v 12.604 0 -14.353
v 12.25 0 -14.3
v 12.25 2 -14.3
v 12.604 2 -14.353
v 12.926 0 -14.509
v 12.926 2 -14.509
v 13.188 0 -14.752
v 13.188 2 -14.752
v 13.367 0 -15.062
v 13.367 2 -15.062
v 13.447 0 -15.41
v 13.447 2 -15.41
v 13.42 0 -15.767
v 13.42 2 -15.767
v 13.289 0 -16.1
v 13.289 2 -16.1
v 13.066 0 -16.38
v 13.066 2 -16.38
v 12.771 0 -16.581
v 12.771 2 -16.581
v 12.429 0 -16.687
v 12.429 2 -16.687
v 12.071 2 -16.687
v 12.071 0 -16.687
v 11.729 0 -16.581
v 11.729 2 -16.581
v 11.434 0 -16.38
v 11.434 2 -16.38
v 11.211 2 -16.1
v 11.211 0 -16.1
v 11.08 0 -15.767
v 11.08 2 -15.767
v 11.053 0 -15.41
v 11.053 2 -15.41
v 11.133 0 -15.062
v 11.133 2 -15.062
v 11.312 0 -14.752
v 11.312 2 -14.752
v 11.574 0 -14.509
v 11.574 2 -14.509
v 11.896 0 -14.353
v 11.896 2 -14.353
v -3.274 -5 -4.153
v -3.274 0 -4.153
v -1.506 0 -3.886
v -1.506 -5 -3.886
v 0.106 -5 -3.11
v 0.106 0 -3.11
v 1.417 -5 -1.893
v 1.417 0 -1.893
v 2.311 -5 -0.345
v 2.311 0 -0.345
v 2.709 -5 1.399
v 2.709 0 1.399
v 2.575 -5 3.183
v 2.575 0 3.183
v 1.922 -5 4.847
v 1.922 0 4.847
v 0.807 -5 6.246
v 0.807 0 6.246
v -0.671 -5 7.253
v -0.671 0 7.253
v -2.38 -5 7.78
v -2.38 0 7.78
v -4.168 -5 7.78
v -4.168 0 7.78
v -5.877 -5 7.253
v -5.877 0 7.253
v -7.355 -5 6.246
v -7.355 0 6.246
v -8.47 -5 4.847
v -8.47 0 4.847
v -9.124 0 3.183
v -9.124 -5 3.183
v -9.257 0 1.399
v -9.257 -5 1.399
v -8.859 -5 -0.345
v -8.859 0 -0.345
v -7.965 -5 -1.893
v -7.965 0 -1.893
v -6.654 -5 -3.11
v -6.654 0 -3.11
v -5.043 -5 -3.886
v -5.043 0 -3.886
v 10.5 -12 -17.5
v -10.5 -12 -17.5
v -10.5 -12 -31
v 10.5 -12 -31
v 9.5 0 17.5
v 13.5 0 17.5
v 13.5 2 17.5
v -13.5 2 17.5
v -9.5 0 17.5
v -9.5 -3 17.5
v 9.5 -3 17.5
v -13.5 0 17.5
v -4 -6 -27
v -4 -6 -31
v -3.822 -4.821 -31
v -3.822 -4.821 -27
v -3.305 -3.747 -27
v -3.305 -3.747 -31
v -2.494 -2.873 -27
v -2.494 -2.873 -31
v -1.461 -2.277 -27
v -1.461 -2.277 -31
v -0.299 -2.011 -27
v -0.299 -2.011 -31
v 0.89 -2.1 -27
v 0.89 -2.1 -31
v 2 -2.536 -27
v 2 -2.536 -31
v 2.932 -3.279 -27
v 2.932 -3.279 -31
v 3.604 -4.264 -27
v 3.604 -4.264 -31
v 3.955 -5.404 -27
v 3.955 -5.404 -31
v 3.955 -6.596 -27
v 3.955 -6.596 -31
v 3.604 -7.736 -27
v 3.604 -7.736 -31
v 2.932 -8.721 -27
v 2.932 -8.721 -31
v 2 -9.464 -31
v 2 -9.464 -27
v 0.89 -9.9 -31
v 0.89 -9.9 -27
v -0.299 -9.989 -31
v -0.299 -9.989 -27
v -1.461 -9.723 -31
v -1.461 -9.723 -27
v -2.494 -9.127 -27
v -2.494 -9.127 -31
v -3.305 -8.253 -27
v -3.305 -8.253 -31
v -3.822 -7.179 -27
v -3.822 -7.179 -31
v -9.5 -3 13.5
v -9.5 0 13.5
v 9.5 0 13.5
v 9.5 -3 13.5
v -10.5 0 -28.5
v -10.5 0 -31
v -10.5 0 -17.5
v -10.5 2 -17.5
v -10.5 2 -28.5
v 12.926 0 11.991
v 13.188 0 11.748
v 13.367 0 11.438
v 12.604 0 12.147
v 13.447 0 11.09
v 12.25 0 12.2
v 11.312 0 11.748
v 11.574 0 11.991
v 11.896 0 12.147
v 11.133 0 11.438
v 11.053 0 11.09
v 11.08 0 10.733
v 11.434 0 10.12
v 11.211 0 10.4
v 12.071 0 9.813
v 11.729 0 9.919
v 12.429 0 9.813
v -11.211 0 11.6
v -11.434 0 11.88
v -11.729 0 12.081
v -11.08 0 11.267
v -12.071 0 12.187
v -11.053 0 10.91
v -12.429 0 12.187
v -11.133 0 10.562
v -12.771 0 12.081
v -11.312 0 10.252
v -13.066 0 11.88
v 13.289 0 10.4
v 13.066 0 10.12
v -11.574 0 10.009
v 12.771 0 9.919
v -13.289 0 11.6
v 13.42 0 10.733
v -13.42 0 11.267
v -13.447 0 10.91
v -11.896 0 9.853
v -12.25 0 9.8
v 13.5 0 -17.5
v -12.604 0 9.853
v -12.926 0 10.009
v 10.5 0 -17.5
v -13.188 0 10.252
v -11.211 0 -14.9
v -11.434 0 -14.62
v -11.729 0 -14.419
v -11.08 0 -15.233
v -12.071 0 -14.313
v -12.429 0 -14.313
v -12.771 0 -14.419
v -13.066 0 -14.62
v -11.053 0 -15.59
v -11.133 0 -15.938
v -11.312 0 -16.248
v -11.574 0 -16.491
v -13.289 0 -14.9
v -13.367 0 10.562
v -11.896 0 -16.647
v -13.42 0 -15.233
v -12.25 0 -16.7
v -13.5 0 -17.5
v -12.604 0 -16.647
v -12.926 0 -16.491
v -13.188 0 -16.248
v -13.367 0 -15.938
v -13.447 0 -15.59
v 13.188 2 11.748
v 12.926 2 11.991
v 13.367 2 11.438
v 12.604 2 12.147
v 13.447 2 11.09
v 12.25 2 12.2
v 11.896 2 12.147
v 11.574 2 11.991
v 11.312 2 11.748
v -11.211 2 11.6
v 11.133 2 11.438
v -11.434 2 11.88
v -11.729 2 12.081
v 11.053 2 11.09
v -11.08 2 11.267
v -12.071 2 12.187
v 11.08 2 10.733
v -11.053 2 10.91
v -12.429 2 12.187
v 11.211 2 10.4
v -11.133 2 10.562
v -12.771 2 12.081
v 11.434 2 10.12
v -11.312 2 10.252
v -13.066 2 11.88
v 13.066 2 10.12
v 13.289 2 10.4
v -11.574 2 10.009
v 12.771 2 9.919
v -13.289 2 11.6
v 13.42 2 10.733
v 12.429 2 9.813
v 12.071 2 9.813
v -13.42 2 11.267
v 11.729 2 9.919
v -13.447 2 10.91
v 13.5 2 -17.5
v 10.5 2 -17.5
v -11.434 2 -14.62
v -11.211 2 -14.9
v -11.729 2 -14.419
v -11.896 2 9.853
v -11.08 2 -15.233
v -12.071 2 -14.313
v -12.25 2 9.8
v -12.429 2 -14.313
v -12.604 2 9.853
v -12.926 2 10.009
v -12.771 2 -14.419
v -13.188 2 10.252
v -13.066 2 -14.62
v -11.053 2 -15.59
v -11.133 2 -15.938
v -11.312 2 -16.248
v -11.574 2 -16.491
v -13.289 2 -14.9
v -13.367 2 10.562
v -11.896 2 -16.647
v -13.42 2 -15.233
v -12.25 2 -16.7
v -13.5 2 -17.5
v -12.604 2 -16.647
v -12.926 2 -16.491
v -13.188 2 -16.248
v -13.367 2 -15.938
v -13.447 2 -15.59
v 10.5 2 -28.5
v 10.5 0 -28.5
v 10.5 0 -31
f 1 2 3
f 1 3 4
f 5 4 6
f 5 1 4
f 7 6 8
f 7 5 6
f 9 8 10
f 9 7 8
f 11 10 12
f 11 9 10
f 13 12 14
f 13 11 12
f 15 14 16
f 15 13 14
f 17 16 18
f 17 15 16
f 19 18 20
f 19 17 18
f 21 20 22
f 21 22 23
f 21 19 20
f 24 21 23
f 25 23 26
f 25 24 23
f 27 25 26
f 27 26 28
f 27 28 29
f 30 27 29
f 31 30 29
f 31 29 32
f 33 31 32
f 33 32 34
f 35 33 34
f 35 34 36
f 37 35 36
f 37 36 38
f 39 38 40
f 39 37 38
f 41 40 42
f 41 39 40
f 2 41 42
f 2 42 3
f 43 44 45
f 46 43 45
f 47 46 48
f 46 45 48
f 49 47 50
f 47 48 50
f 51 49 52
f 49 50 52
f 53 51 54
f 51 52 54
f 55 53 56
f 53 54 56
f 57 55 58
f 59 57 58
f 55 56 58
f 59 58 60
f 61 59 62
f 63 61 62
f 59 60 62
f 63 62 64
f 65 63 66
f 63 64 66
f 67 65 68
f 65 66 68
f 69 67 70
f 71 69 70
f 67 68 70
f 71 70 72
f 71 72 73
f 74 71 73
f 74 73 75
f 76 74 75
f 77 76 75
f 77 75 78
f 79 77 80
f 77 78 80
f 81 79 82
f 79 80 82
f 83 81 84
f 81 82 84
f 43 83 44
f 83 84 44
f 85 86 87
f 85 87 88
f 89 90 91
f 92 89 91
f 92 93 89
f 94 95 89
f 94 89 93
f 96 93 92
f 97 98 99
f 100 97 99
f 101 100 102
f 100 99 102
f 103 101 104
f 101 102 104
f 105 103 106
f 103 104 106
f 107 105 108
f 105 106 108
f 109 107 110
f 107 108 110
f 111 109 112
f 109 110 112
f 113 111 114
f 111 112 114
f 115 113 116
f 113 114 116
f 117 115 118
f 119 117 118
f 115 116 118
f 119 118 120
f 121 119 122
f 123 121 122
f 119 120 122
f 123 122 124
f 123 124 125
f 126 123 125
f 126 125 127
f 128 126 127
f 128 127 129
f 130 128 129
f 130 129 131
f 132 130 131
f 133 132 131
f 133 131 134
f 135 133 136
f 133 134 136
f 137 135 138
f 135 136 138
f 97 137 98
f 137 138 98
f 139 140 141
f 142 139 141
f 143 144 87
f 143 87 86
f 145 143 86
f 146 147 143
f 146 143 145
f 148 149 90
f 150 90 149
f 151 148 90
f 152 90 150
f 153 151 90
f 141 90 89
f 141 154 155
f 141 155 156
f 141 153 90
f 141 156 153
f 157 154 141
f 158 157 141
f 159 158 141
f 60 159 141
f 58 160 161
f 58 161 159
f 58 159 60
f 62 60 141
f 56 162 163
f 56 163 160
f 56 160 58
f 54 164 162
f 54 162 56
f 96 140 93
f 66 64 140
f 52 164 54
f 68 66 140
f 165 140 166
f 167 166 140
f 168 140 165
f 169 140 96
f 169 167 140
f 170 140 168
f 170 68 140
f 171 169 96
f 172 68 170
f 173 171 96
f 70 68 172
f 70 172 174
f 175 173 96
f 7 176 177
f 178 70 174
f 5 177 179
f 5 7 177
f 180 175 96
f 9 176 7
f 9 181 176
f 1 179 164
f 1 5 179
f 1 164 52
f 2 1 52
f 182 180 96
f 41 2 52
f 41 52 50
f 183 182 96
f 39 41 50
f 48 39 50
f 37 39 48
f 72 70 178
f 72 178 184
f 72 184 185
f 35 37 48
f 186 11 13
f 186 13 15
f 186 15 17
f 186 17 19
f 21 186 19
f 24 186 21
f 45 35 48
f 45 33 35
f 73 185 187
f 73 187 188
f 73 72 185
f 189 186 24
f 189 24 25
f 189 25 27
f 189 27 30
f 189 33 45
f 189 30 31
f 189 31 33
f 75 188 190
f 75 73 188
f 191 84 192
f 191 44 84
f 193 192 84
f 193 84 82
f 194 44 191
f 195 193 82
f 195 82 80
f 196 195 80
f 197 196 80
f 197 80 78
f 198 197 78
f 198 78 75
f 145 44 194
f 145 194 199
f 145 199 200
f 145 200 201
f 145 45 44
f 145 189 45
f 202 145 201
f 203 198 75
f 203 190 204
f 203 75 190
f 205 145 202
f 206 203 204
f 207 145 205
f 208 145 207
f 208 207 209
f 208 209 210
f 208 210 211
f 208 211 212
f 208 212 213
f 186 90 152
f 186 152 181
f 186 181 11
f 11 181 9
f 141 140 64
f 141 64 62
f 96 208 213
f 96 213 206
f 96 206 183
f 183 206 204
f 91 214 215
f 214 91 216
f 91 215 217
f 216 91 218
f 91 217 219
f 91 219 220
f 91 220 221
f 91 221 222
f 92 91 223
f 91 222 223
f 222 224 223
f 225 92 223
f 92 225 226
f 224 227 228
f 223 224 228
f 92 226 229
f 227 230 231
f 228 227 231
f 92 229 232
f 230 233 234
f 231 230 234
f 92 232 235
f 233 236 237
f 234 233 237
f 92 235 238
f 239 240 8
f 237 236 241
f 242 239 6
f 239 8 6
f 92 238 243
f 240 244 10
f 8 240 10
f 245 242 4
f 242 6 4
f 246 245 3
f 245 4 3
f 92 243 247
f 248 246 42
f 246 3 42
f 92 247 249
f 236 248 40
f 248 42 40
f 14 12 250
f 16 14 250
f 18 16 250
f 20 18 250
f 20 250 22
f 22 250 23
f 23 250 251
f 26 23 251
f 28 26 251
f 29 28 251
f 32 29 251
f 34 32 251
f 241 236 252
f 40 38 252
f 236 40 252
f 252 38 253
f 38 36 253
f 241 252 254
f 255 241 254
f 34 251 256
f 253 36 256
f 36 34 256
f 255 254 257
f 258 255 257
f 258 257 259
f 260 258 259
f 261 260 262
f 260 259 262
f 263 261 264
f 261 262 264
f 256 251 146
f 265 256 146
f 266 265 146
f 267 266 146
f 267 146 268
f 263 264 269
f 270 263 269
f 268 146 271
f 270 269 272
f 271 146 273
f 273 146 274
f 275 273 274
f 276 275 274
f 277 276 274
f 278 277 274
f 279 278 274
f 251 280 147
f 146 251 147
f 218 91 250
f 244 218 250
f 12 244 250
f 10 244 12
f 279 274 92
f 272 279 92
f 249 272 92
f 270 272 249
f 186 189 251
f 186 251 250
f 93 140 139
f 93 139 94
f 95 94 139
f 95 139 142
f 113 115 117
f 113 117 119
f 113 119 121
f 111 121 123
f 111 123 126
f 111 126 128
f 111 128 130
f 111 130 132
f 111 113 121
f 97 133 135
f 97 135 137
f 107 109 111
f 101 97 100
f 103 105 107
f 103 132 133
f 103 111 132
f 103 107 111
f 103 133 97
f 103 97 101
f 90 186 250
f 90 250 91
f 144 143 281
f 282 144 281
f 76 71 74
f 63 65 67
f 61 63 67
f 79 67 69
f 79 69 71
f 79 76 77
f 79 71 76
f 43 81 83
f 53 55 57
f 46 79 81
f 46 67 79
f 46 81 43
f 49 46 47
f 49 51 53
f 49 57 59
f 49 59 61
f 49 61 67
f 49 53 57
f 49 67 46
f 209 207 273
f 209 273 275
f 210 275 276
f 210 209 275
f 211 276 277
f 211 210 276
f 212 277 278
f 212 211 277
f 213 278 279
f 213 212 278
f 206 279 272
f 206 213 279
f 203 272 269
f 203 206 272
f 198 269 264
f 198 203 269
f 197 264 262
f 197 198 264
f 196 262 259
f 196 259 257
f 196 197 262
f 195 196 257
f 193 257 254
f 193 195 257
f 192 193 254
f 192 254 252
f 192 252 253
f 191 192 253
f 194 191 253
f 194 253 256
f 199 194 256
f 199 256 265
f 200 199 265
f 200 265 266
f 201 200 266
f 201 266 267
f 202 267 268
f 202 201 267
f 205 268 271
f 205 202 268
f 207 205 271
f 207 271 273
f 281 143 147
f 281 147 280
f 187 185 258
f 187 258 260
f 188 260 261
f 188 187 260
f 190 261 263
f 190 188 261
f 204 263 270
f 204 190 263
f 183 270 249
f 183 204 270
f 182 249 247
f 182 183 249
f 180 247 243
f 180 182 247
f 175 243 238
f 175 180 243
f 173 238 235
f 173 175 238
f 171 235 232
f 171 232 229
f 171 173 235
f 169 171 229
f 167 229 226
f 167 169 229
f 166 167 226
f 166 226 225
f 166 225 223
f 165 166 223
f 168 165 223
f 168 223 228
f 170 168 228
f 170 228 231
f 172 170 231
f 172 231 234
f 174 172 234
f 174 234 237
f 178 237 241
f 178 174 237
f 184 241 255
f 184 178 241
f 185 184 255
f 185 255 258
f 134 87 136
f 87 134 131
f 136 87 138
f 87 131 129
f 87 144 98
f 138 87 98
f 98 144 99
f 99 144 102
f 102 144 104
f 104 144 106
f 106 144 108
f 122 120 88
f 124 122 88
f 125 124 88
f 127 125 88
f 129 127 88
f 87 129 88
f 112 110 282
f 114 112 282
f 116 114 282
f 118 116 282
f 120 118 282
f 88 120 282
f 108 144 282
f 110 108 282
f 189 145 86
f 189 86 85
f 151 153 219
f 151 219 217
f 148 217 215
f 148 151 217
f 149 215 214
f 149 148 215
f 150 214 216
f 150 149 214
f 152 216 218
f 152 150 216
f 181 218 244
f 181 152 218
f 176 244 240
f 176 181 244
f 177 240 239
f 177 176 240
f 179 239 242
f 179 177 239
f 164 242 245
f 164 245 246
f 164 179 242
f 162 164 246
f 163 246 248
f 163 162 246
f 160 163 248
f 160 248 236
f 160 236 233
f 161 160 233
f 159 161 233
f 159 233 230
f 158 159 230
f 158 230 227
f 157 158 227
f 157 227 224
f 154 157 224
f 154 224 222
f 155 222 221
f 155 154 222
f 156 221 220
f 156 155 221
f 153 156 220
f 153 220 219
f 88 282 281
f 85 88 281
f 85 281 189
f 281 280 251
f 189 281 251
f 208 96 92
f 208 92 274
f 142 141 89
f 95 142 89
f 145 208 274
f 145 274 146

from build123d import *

# Parameters (mm, degrees)
SKETCH_1_R          = 1.2
EXTRUDE_1_DEPTH     = 2
SKETCH_2_W          = 21
SKETCH_2_H          = 13.5
EXTRUDE_2_DEPTH     = 12
SKETCH_3_R          = 4
CUT_EXTRUDE_1_DEPTH = 4
SKETCH_4_W          = 19
SKETCH_4_H          = 4
EXTRUDE_3_DEPTH     = 3
SKETCH_5_R          = 6
EXTRUDE_4_DEPTH     = 5


with BuildPart() as part:
    # 草图1 → 凸台-拉伸1 (new body)
    with BuildSketch(Plane(origin=(0, 0, 0), x_dir=(1, 0, 0), z_dir=(0, 1, 0))):
        Polygon((10.5, 17.5), (13.5, 17.5), (13.5, -17.5), (-13.5, -17.5), (-13.5, 17.5), (-10.5, 17.5), (-10.5, 28.5), (10.5, 28.5), align=None)
        with Locations(Location((12.25, -11, 0), (0, 0, 270))):
            Circle(SKETCH_1_R, mode=Mode.SUBTRACT)
        with Locations(Location((12.25, 15.5, 0), (0, 0, 270))):
            Circle(SKETCH_1_R, mode=Mode.SUBTRACT)
        with Locations(Location((-12.25, 15.5, 0), (0, 0, 90))):
            Circle(SKETCH_1_R, mode=Mode.SUBTRACT)
        with Locations(Location((-12.25, -11, 0), (0, 0, 90))):
            Circle(SKETCH_1_R, mode=Mode.SUBTRACT)
    extrude(amount=EXTRUDE_1_DEPTH)

    # 草图2 → 凸台-拉伸2 (add)
    with BuildSketch(Plane.XZ):
        with Locations((0, -24.25)):
            Rectangle(SKETCH_2_W, SKETCH_2_H)
    extrude(amount=EXTRUDE_2_DEPTH)

    # 草图3 → 切除-拉伸1 (cut)
    with BuildSketch(Plane(origin=(0, 0, -31), x_dir=(-1, 0, 0), z_dir=(0, 0, -1))):
        with Locations((0, -6)):
            Circle(SKETCH_3_R)
    extrude(amount=-CUT_EXTRUDE_1_DEPTH, mode=Mode.SUBTRACT)

    # 草图4 → 凸台-拉伸3 (add)
    with BuildSketch(Plane.XZ):
        with Locations((0, 15.5)):
            Rectangle(SKETCH_4_W, SKETCH_4_H)
    extrude(amount=EXTRUDE_3_DEPTH)

    # 草图5 → 凸台-拉伸4 (add)
    with BuildSketch(Plane.XZ):
        with Locations(Location((-3.274170516, 1.847483042, 0), (0, 0, 270))):
            Circle(SKETCH_5_R)
    extrude(amount=EXTRUDE_4_DEPTH)


solid = part.part
